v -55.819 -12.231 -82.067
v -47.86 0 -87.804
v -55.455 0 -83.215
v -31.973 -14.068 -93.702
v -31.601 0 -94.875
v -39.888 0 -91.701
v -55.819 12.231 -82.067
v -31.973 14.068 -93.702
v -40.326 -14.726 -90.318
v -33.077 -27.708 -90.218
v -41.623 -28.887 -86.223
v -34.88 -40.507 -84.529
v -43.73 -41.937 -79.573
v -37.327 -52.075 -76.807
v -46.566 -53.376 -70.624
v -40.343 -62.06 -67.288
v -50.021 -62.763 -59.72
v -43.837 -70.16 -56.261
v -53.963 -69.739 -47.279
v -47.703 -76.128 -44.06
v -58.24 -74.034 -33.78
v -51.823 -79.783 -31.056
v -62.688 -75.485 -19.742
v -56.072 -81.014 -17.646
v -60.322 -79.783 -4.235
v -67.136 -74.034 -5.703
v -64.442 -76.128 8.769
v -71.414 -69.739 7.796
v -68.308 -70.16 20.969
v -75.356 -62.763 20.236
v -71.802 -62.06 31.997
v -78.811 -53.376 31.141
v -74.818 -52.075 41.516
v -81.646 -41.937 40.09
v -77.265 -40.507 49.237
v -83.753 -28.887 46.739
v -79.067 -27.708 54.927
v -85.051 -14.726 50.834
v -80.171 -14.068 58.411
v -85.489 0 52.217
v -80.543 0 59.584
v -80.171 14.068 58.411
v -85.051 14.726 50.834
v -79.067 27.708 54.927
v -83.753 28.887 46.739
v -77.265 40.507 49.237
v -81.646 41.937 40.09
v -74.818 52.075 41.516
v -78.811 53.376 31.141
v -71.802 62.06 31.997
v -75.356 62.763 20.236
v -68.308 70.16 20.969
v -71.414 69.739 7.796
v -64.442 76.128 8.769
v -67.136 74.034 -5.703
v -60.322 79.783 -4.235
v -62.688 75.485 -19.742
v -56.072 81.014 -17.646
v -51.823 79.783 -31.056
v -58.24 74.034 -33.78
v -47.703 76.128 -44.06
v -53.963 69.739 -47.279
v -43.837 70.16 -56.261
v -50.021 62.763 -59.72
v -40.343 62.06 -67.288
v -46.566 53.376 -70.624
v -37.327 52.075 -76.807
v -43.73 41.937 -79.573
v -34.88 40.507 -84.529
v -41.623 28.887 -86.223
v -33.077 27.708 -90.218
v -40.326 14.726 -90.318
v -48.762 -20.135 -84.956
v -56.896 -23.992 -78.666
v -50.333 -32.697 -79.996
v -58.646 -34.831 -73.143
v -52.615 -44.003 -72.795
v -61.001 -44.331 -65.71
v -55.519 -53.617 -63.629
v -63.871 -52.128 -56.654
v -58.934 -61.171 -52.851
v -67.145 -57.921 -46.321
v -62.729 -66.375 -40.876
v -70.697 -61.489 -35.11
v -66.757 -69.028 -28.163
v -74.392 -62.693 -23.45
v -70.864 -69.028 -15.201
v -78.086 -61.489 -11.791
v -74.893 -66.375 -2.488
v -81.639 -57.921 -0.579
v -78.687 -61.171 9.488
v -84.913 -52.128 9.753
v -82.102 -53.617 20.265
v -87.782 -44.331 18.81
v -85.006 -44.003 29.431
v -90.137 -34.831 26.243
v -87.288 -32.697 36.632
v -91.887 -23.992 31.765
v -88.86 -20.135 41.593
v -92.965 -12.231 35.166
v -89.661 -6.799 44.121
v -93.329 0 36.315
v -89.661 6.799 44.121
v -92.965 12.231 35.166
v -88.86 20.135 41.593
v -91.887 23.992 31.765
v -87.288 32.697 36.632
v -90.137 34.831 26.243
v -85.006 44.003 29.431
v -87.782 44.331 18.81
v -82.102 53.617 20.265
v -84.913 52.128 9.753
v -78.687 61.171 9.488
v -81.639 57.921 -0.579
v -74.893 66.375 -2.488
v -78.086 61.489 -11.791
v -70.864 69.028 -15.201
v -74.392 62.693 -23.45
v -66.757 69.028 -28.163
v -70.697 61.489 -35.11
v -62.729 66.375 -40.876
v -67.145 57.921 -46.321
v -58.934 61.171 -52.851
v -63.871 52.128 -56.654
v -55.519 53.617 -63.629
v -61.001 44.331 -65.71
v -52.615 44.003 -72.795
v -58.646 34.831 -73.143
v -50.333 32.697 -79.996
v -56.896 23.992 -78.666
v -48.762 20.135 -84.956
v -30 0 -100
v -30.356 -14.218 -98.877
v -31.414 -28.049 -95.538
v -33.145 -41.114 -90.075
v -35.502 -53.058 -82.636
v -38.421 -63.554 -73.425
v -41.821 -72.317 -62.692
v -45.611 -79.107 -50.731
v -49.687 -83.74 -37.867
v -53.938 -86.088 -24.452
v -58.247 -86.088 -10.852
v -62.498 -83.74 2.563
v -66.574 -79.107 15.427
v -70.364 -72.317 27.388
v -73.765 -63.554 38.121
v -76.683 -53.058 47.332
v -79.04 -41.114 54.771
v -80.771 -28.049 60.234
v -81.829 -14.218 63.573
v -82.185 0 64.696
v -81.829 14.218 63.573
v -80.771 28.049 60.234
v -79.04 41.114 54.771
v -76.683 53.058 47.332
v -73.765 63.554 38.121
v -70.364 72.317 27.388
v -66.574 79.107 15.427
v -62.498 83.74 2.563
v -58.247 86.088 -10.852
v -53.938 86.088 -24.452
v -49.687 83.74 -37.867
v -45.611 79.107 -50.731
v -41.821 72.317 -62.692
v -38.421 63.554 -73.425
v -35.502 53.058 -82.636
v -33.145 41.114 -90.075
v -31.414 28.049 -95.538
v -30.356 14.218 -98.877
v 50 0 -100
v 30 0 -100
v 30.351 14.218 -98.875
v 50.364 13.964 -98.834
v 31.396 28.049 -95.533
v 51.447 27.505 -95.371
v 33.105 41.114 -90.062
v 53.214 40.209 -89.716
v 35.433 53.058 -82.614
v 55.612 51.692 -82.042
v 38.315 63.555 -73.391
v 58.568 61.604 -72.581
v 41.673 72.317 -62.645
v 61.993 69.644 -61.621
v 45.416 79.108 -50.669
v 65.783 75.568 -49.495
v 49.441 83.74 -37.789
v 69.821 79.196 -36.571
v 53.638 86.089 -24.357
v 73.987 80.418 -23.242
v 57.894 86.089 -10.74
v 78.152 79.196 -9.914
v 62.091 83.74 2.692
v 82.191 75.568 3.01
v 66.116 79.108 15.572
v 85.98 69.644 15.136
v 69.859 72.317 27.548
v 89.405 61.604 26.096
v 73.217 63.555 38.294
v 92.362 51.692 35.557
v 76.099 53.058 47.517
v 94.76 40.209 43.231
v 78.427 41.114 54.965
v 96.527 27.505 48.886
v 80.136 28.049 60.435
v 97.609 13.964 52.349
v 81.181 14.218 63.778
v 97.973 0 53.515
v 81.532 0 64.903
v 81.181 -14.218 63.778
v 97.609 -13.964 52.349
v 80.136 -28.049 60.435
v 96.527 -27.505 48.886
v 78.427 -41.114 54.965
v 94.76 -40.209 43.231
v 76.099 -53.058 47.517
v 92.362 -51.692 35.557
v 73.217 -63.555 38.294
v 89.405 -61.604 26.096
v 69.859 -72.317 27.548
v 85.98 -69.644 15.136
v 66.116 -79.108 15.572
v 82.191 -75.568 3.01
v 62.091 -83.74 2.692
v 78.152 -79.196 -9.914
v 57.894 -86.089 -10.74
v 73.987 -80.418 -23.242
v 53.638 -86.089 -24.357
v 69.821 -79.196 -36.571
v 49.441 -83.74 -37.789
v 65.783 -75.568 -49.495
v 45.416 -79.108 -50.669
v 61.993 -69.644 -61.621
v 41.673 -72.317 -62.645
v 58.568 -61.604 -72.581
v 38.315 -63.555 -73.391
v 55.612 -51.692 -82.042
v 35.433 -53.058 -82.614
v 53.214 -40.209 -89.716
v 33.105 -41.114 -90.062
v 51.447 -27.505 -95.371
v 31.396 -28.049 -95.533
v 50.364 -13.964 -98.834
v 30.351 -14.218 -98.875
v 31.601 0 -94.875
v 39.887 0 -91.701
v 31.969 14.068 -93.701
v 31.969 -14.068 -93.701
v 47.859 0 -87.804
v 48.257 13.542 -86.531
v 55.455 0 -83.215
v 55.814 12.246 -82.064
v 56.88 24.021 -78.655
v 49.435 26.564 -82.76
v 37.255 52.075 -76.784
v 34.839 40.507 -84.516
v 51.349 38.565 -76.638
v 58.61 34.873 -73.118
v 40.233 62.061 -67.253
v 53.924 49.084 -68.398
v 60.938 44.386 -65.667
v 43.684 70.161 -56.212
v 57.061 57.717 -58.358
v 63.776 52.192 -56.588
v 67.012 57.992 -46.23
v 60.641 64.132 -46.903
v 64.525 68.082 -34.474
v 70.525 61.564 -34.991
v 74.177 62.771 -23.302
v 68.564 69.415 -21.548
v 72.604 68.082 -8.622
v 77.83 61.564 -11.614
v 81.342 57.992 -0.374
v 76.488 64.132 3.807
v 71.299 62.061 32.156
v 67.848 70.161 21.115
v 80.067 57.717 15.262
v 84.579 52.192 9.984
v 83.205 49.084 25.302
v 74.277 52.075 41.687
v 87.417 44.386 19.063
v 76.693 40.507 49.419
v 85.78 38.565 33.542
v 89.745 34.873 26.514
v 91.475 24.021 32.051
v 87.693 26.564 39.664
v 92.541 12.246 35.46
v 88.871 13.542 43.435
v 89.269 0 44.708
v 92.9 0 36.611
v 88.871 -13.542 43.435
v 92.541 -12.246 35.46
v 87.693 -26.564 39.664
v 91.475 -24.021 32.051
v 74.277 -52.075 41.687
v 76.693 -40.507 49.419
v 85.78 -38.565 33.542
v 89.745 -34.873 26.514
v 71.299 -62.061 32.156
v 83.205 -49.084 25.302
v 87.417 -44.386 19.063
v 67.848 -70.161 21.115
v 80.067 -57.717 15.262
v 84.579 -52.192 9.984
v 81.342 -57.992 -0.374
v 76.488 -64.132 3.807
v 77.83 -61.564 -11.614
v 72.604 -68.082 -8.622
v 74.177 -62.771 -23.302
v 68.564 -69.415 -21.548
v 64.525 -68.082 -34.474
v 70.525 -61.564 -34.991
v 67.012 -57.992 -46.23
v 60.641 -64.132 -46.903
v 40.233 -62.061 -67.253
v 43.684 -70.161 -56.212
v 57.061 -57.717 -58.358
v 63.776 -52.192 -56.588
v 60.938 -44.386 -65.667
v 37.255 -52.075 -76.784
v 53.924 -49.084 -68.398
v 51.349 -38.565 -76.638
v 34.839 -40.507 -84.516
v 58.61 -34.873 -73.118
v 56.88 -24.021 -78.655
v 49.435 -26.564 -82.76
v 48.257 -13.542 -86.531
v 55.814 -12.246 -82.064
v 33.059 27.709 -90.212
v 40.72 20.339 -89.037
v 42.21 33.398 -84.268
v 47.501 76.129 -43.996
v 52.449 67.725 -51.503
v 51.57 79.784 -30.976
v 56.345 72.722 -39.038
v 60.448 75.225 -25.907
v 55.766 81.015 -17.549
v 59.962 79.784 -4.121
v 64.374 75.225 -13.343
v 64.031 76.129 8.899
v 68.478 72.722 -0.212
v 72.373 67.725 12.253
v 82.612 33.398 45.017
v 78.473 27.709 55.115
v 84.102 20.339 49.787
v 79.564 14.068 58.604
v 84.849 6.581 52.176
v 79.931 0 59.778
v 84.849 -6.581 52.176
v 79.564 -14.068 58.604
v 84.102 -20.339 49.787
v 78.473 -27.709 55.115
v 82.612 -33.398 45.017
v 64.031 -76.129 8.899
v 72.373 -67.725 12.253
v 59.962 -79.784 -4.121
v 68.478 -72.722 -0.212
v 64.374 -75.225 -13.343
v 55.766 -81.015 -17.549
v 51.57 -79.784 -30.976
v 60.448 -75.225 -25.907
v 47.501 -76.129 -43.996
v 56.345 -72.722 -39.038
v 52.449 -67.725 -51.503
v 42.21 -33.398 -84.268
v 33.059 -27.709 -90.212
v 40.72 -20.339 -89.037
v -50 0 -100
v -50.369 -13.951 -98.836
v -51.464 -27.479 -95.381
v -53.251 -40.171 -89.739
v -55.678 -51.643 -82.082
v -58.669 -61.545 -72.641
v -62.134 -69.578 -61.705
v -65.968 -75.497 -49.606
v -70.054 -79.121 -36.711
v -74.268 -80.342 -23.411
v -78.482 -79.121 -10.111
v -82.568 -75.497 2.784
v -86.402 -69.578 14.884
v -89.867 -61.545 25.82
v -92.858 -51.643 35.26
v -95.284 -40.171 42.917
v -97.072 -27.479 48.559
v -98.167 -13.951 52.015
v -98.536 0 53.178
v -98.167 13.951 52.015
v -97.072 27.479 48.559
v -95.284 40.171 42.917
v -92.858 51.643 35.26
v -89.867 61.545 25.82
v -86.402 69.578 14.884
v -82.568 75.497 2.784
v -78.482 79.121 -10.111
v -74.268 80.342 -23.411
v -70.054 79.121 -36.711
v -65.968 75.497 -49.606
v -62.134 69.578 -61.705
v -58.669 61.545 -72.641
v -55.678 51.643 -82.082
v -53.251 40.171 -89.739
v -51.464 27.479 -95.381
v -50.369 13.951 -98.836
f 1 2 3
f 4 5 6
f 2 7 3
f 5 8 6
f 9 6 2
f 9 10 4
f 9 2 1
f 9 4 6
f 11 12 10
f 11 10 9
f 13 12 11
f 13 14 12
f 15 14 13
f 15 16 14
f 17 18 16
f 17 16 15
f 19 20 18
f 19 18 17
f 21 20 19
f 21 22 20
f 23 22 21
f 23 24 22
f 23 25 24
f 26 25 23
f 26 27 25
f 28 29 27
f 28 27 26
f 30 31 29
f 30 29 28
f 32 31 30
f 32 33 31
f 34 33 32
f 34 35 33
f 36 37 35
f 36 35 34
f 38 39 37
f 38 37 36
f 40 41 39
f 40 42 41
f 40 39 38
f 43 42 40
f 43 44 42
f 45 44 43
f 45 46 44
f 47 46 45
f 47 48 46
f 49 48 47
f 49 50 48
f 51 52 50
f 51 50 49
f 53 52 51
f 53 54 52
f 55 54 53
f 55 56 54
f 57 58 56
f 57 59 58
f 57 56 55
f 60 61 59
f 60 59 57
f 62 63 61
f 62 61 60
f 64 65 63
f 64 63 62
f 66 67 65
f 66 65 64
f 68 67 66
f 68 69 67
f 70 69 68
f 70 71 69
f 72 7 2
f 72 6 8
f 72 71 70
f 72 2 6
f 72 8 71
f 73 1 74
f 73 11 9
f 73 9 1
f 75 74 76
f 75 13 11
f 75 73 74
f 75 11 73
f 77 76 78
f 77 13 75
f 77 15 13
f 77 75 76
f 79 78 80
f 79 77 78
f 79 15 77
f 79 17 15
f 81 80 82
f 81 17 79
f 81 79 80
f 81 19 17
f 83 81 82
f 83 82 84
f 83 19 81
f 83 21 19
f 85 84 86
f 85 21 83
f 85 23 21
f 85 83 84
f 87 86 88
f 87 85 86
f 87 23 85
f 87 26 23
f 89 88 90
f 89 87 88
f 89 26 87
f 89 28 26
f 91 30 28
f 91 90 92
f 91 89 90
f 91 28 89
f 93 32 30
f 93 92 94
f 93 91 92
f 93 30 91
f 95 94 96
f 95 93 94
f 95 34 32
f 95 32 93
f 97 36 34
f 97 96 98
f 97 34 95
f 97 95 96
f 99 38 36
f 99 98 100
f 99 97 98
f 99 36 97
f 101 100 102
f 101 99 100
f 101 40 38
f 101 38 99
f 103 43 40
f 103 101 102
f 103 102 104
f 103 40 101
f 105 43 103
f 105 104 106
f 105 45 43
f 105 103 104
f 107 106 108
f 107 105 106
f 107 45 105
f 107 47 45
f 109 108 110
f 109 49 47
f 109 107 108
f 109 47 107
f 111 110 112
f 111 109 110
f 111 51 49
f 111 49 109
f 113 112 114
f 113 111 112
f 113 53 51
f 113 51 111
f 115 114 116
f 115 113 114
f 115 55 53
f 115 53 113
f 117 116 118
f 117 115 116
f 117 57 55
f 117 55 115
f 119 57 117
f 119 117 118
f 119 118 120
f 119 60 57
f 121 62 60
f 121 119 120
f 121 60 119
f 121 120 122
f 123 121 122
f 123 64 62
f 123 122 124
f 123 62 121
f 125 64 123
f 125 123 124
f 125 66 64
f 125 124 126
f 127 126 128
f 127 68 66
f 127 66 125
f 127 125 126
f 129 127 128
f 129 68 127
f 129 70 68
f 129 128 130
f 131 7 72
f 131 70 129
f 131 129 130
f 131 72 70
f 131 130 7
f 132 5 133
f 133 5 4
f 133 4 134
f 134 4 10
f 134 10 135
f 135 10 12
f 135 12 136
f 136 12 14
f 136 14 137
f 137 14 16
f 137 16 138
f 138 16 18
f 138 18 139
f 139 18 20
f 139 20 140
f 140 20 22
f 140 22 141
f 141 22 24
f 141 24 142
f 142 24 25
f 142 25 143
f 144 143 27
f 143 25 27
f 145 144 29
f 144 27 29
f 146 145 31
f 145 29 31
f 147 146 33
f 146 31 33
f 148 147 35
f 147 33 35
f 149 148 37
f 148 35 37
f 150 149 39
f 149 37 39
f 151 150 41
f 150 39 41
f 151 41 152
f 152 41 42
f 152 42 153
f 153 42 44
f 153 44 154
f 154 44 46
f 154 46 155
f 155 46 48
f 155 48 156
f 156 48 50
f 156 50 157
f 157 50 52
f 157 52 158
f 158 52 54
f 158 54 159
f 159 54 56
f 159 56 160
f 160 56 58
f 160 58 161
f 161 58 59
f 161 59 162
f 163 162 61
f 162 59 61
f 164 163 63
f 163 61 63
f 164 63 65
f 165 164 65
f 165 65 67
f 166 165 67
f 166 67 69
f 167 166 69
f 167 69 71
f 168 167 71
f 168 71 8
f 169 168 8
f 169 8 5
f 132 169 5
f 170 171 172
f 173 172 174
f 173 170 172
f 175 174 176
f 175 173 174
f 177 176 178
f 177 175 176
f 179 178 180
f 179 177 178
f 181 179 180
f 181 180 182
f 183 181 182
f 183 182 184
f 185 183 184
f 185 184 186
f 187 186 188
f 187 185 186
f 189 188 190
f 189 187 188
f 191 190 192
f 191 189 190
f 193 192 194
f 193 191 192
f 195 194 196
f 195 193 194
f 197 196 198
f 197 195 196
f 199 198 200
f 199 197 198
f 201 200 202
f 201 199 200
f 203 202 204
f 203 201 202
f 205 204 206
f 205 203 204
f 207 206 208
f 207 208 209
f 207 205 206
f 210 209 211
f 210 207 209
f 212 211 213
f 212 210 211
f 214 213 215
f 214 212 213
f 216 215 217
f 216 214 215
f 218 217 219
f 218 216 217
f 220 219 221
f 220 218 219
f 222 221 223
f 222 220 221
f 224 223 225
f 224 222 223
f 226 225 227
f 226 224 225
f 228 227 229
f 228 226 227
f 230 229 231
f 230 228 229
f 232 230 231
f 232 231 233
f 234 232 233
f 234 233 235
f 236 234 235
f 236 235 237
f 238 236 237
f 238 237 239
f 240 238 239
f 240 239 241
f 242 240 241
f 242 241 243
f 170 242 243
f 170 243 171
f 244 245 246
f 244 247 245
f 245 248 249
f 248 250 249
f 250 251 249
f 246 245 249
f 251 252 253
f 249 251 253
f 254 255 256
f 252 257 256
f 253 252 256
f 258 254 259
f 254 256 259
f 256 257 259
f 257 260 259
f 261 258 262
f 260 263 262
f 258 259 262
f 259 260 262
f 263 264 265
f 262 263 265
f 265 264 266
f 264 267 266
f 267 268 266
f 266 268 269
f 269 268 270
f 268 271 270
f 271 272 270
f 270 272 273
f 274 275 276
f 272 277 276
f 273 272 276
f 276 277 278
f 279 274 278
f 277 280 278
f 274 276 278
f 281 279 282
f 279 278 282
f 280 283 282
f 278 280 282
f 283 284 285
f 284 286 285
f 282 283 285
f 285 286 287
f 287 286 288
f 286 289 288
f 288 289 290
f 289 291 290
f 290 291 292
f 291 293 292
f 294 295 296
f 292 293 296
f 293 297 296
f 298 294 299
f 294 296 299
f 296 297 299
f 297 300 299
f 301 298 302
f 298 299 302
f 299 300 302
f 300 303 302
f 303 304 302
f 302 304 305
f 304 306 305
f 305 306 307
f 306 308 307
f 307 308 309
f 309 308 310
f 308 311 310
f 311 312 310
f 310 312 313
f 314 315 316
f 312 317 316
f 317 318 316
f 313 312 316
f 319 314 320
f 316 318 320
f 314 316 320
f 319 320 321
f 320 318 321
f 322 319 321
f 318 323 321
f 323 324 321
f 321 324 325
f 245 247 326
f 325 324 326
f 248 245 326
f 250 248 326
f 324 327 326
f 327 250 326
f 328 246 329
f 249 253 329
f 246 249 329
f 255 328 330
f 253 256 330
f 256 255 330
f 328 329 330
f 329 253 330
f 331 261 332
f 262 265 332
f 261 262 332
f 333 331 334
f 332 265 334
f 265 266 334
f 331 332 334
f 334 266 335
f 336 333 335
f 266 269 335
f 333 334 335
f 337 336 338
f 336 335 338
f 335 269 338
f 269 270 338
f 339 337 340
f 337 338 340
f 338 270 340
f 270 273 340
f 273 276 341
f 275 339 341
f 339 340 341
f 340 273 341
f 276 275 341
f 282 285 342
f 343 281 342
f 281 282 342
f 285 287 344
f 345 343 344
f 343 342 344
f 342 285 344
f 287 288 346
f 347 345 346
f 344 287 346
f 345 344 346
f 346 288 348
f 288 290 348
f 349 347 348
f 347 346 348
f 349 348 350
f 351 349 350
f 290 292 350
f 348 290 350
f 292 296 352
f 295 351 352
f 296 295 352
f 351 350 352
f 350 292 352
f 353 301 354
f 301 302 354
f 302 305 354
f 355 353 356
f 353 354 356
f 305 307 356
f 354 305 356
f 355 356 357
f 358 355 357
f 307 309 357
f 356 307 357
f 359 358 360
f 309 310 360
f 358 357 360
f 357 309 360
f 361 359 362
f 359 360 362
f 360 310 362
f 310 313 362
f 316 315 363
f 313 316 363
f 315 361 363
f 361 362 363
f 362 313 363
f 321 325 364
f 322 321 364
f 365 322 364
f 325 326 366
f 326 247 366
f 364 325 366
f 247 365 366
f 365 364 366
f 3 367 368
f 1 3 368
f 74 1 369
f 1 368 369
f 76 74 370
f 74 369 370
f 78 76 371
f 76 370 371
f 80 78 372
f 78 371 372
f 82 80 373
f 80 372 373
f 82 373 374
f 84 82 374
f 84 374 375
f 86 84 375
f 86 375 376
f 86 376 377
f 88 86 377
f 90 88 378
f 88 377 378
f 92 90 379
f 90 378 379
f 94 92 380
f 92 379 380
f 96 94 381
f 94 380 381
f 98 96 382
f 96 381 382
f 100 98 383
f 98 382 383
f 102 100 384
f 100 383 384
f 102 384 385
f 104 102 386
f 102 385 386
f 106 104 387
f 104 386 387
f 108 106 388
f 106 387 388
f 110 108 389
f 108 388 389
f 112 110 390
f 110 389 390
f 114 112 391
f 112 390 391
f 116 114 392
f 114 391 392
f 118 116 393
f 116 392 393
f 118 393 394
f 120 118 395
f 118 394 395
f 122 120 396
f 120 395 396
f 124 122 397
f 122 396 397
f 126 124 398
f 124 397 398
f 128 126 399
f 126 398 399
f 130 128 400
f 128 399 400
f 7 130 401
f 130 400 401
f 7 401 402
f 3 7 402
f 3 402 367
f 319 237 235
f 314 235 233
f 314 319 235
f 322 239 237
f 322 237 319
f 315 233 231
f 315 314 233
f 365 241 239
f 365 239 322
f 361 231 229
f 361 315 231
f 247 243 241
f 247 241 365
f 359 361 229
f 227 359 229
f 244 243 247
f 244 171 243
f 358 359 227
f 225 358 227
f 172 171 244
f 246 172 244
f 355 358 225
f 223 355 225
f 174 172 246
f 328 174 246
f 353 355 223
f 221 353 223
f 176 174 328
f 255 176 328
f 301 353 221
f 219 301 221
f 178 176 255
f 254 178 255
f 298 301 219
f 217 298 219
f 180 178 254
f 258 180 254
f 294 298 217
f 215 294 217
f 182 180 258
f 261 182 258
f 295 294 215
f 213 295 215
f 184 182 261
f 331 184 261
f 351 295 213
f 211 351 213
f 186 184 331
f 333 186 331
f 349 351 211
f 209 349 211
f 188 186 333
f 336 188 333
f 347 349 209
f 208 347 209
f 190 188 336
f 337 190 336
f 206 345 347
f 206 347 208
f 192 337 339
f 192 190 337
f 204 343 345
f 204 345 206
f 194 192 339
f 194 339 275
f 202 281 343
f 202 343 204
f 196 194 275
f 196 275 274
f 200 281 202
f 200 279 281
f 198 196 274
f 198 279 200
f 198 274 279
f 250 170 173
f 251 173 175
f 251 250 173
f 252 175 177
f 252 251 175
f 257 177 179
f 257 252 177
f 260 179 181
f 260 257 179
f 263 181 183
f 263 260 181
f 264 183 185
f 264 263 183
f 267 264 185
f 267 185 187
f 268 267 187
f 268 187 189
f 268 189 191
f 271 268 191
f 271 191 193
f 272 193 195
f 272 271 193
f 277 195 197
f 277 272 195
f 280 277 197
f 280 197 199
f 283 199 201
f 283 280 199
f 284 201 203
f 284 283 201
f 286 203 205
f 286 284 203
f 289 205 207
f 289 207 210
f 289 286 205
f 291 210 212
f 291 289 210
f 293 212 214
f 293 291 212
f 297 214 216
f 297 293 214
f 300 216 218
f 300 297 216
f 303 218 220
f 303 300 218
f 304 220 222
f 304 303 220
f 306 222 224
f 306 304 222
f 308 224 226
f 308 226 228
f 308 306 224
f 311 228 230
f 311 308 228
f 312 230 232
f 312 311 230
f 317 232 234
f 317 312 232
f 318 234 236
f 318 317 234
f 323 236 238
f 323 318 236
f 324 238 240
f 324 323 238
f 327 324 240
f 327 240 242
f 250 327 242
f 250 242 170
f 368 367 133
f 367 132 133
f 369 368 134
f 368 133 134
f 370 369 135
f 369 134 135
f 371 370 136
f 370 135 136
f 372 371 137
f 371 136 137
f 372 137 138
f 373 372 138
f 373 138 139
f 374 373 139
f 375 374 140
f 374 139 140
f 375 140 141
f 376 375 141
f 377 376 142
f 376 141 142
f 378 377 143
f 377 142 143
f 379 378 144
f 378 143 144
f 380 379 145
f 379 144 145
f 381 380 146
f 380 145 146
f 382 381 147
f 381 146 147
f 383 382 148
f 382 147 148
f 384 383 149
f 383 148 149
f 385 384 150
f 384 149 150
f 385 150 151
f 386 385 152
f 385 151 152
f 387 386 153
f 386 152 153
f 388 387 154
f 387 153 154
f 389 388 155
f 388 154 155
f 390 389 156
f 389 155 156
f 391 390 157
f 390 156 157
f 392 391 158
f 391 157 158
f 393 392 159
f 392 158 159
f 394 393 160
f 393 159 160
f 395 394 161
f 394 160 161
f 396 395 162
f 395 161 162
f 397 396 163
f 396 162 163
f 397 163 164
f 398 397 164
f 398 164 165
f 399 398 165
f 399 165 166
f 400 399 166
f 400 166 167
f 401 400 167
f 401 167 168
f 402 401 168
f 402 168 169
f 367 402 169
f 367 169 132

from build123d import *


with BuildPart() as f1:
    # F0 (on Front) → F1 (revolve)
    with BuildSketch(Plane.XZ):
        with BuildLine():
            Line((-31.6014234875, -94.8754448399), (-55.7660811508, -17.5485403173))
            Line((-55.7660811508, -17.5485403173), (-74.8318771378, -23.5896845288))
            Line((-74.8318771378, -23.5896845288), (-55.4547290403, -83.2152211261))
            ThreePointArc((-55.4547290403, -83.2152211261), (-43.9167807051, -89.8405051883), (-31.6014234875, -94.8754448399))
        make_face()
        with BuildLine():
            Line((-30, -100), (-31.6014234875, -94.8754448399))
            ThreePointArc((-31.6014234875, -94.8754448399), (-43.9167807051, -89.8405051883), (-55.4547290403, -83.2152211261))
            Line((-55.4547290403, -83.2152211261), (-50, -100))
            Line((-50, -100), (-30, -100))
        make_face()
    revolve(axis=Axis((-75.5649730165, 0, -23.8219716007), (-0.9532897993, 0, -0.3020572106)))

    # F0 (on Front) → F2 (revolve, cut)
    with BuildSketch(Plane.XZ):
        with BuildLine():
            Line((-31.6014234875, -94.8754448399), (-55.7660811508, -17.5485403173))
            Line((-55.7660811508, -17.5485403173), (-74.8318771378, -23.5896845288))
            Line((-74.8318771378, -23.5896845288), (-55.4547290403, -83.2152211261))
            ThreePointArc((-55.4547290403, -83.2152211261), (-43.9167807051, -89.8405051883), (-31.6014234875, -94.8754448399))
        make_face()
        with BuildLine():
            Line((-74.8318771378, -23.5896845288), (-95.3638648821, -30.0954028841))
            ThreePointArc((-95.3638648821, -30.0954028841), (-79.9499270838, -60.0667059135), (-55.4547290403, -83.2152211261))
            Line((-55.4547290403, -83.2152211261), (-74.8318771378, -23.5896845288))
        make_face()
    revolve(axis=Axis((-75.5649730165, 0, -23.8219716007), (-0.9532897993, 0, -0.3020572106)), mode=Mode.SUBTRACT)


with BuildPart() as f3:
    # F0 (on Front) → F3 (revolve)
    with BuildSketch(Plane.XZ):
        with BuildLine():
            ThreePointArc((31.6014234875, -94.8754448399), (43.9166628588, -89.8405627951), (55.4545107287, -83.2153666088))
            Line((55.4545107287, -83.2153666088), (74.8556807115, -23.51404018))
            Line((74.8556807115, -23.51404018), (55.7660811508, -17.5485403173))
            Line((55.7660811508, -17.5485403173), (31.6014234875, -94.8754448399))
        make_face()
        with BuildLine():
            Line((50, -100), (55.4545107287, -83.2153666088))
            ThreePointArc((55.4545107287, -83.2153666088), (43.9166628588, -89.8405627951), (31.6014234875, -94.8754448399))
            Line((31.6014234875, -94.8754448399), (30, -100))
            Line((30, -100), (50, -100))
        make_face()
    revolve(axis=Axis((65.3108809312, 0, -20.5312902486), (0.954479978, 0, -0.2982749931)))

    # F0 (on Front) → F4 (revolve, cut)
    with BuildSketch(Plane.XZ):
        with BuildLine():
            ThreePointArc((31.6014234875, -94.8754448399), (43.9166628588, -89.8405627951), (55.4545107287, -83.2153666088))
            Line((55.4545107287, -83.2153666088), (74.8556807115, -23.51404018))
            Line((74.8556807115, -23.51404018), (55.7660811508, -17.5485403173))
            Line((55.7660811508, -17.5485403173), (31.6014234875, -94.8754448399))
        make_face()
    revolve(axis=Axis((65.3108809312, 0, -20.5312902486), (0.954479978, 0, -0.2982749931)), mode=Mode.SUBTRACT)


solid = Compound([f1.part, f3.part])
